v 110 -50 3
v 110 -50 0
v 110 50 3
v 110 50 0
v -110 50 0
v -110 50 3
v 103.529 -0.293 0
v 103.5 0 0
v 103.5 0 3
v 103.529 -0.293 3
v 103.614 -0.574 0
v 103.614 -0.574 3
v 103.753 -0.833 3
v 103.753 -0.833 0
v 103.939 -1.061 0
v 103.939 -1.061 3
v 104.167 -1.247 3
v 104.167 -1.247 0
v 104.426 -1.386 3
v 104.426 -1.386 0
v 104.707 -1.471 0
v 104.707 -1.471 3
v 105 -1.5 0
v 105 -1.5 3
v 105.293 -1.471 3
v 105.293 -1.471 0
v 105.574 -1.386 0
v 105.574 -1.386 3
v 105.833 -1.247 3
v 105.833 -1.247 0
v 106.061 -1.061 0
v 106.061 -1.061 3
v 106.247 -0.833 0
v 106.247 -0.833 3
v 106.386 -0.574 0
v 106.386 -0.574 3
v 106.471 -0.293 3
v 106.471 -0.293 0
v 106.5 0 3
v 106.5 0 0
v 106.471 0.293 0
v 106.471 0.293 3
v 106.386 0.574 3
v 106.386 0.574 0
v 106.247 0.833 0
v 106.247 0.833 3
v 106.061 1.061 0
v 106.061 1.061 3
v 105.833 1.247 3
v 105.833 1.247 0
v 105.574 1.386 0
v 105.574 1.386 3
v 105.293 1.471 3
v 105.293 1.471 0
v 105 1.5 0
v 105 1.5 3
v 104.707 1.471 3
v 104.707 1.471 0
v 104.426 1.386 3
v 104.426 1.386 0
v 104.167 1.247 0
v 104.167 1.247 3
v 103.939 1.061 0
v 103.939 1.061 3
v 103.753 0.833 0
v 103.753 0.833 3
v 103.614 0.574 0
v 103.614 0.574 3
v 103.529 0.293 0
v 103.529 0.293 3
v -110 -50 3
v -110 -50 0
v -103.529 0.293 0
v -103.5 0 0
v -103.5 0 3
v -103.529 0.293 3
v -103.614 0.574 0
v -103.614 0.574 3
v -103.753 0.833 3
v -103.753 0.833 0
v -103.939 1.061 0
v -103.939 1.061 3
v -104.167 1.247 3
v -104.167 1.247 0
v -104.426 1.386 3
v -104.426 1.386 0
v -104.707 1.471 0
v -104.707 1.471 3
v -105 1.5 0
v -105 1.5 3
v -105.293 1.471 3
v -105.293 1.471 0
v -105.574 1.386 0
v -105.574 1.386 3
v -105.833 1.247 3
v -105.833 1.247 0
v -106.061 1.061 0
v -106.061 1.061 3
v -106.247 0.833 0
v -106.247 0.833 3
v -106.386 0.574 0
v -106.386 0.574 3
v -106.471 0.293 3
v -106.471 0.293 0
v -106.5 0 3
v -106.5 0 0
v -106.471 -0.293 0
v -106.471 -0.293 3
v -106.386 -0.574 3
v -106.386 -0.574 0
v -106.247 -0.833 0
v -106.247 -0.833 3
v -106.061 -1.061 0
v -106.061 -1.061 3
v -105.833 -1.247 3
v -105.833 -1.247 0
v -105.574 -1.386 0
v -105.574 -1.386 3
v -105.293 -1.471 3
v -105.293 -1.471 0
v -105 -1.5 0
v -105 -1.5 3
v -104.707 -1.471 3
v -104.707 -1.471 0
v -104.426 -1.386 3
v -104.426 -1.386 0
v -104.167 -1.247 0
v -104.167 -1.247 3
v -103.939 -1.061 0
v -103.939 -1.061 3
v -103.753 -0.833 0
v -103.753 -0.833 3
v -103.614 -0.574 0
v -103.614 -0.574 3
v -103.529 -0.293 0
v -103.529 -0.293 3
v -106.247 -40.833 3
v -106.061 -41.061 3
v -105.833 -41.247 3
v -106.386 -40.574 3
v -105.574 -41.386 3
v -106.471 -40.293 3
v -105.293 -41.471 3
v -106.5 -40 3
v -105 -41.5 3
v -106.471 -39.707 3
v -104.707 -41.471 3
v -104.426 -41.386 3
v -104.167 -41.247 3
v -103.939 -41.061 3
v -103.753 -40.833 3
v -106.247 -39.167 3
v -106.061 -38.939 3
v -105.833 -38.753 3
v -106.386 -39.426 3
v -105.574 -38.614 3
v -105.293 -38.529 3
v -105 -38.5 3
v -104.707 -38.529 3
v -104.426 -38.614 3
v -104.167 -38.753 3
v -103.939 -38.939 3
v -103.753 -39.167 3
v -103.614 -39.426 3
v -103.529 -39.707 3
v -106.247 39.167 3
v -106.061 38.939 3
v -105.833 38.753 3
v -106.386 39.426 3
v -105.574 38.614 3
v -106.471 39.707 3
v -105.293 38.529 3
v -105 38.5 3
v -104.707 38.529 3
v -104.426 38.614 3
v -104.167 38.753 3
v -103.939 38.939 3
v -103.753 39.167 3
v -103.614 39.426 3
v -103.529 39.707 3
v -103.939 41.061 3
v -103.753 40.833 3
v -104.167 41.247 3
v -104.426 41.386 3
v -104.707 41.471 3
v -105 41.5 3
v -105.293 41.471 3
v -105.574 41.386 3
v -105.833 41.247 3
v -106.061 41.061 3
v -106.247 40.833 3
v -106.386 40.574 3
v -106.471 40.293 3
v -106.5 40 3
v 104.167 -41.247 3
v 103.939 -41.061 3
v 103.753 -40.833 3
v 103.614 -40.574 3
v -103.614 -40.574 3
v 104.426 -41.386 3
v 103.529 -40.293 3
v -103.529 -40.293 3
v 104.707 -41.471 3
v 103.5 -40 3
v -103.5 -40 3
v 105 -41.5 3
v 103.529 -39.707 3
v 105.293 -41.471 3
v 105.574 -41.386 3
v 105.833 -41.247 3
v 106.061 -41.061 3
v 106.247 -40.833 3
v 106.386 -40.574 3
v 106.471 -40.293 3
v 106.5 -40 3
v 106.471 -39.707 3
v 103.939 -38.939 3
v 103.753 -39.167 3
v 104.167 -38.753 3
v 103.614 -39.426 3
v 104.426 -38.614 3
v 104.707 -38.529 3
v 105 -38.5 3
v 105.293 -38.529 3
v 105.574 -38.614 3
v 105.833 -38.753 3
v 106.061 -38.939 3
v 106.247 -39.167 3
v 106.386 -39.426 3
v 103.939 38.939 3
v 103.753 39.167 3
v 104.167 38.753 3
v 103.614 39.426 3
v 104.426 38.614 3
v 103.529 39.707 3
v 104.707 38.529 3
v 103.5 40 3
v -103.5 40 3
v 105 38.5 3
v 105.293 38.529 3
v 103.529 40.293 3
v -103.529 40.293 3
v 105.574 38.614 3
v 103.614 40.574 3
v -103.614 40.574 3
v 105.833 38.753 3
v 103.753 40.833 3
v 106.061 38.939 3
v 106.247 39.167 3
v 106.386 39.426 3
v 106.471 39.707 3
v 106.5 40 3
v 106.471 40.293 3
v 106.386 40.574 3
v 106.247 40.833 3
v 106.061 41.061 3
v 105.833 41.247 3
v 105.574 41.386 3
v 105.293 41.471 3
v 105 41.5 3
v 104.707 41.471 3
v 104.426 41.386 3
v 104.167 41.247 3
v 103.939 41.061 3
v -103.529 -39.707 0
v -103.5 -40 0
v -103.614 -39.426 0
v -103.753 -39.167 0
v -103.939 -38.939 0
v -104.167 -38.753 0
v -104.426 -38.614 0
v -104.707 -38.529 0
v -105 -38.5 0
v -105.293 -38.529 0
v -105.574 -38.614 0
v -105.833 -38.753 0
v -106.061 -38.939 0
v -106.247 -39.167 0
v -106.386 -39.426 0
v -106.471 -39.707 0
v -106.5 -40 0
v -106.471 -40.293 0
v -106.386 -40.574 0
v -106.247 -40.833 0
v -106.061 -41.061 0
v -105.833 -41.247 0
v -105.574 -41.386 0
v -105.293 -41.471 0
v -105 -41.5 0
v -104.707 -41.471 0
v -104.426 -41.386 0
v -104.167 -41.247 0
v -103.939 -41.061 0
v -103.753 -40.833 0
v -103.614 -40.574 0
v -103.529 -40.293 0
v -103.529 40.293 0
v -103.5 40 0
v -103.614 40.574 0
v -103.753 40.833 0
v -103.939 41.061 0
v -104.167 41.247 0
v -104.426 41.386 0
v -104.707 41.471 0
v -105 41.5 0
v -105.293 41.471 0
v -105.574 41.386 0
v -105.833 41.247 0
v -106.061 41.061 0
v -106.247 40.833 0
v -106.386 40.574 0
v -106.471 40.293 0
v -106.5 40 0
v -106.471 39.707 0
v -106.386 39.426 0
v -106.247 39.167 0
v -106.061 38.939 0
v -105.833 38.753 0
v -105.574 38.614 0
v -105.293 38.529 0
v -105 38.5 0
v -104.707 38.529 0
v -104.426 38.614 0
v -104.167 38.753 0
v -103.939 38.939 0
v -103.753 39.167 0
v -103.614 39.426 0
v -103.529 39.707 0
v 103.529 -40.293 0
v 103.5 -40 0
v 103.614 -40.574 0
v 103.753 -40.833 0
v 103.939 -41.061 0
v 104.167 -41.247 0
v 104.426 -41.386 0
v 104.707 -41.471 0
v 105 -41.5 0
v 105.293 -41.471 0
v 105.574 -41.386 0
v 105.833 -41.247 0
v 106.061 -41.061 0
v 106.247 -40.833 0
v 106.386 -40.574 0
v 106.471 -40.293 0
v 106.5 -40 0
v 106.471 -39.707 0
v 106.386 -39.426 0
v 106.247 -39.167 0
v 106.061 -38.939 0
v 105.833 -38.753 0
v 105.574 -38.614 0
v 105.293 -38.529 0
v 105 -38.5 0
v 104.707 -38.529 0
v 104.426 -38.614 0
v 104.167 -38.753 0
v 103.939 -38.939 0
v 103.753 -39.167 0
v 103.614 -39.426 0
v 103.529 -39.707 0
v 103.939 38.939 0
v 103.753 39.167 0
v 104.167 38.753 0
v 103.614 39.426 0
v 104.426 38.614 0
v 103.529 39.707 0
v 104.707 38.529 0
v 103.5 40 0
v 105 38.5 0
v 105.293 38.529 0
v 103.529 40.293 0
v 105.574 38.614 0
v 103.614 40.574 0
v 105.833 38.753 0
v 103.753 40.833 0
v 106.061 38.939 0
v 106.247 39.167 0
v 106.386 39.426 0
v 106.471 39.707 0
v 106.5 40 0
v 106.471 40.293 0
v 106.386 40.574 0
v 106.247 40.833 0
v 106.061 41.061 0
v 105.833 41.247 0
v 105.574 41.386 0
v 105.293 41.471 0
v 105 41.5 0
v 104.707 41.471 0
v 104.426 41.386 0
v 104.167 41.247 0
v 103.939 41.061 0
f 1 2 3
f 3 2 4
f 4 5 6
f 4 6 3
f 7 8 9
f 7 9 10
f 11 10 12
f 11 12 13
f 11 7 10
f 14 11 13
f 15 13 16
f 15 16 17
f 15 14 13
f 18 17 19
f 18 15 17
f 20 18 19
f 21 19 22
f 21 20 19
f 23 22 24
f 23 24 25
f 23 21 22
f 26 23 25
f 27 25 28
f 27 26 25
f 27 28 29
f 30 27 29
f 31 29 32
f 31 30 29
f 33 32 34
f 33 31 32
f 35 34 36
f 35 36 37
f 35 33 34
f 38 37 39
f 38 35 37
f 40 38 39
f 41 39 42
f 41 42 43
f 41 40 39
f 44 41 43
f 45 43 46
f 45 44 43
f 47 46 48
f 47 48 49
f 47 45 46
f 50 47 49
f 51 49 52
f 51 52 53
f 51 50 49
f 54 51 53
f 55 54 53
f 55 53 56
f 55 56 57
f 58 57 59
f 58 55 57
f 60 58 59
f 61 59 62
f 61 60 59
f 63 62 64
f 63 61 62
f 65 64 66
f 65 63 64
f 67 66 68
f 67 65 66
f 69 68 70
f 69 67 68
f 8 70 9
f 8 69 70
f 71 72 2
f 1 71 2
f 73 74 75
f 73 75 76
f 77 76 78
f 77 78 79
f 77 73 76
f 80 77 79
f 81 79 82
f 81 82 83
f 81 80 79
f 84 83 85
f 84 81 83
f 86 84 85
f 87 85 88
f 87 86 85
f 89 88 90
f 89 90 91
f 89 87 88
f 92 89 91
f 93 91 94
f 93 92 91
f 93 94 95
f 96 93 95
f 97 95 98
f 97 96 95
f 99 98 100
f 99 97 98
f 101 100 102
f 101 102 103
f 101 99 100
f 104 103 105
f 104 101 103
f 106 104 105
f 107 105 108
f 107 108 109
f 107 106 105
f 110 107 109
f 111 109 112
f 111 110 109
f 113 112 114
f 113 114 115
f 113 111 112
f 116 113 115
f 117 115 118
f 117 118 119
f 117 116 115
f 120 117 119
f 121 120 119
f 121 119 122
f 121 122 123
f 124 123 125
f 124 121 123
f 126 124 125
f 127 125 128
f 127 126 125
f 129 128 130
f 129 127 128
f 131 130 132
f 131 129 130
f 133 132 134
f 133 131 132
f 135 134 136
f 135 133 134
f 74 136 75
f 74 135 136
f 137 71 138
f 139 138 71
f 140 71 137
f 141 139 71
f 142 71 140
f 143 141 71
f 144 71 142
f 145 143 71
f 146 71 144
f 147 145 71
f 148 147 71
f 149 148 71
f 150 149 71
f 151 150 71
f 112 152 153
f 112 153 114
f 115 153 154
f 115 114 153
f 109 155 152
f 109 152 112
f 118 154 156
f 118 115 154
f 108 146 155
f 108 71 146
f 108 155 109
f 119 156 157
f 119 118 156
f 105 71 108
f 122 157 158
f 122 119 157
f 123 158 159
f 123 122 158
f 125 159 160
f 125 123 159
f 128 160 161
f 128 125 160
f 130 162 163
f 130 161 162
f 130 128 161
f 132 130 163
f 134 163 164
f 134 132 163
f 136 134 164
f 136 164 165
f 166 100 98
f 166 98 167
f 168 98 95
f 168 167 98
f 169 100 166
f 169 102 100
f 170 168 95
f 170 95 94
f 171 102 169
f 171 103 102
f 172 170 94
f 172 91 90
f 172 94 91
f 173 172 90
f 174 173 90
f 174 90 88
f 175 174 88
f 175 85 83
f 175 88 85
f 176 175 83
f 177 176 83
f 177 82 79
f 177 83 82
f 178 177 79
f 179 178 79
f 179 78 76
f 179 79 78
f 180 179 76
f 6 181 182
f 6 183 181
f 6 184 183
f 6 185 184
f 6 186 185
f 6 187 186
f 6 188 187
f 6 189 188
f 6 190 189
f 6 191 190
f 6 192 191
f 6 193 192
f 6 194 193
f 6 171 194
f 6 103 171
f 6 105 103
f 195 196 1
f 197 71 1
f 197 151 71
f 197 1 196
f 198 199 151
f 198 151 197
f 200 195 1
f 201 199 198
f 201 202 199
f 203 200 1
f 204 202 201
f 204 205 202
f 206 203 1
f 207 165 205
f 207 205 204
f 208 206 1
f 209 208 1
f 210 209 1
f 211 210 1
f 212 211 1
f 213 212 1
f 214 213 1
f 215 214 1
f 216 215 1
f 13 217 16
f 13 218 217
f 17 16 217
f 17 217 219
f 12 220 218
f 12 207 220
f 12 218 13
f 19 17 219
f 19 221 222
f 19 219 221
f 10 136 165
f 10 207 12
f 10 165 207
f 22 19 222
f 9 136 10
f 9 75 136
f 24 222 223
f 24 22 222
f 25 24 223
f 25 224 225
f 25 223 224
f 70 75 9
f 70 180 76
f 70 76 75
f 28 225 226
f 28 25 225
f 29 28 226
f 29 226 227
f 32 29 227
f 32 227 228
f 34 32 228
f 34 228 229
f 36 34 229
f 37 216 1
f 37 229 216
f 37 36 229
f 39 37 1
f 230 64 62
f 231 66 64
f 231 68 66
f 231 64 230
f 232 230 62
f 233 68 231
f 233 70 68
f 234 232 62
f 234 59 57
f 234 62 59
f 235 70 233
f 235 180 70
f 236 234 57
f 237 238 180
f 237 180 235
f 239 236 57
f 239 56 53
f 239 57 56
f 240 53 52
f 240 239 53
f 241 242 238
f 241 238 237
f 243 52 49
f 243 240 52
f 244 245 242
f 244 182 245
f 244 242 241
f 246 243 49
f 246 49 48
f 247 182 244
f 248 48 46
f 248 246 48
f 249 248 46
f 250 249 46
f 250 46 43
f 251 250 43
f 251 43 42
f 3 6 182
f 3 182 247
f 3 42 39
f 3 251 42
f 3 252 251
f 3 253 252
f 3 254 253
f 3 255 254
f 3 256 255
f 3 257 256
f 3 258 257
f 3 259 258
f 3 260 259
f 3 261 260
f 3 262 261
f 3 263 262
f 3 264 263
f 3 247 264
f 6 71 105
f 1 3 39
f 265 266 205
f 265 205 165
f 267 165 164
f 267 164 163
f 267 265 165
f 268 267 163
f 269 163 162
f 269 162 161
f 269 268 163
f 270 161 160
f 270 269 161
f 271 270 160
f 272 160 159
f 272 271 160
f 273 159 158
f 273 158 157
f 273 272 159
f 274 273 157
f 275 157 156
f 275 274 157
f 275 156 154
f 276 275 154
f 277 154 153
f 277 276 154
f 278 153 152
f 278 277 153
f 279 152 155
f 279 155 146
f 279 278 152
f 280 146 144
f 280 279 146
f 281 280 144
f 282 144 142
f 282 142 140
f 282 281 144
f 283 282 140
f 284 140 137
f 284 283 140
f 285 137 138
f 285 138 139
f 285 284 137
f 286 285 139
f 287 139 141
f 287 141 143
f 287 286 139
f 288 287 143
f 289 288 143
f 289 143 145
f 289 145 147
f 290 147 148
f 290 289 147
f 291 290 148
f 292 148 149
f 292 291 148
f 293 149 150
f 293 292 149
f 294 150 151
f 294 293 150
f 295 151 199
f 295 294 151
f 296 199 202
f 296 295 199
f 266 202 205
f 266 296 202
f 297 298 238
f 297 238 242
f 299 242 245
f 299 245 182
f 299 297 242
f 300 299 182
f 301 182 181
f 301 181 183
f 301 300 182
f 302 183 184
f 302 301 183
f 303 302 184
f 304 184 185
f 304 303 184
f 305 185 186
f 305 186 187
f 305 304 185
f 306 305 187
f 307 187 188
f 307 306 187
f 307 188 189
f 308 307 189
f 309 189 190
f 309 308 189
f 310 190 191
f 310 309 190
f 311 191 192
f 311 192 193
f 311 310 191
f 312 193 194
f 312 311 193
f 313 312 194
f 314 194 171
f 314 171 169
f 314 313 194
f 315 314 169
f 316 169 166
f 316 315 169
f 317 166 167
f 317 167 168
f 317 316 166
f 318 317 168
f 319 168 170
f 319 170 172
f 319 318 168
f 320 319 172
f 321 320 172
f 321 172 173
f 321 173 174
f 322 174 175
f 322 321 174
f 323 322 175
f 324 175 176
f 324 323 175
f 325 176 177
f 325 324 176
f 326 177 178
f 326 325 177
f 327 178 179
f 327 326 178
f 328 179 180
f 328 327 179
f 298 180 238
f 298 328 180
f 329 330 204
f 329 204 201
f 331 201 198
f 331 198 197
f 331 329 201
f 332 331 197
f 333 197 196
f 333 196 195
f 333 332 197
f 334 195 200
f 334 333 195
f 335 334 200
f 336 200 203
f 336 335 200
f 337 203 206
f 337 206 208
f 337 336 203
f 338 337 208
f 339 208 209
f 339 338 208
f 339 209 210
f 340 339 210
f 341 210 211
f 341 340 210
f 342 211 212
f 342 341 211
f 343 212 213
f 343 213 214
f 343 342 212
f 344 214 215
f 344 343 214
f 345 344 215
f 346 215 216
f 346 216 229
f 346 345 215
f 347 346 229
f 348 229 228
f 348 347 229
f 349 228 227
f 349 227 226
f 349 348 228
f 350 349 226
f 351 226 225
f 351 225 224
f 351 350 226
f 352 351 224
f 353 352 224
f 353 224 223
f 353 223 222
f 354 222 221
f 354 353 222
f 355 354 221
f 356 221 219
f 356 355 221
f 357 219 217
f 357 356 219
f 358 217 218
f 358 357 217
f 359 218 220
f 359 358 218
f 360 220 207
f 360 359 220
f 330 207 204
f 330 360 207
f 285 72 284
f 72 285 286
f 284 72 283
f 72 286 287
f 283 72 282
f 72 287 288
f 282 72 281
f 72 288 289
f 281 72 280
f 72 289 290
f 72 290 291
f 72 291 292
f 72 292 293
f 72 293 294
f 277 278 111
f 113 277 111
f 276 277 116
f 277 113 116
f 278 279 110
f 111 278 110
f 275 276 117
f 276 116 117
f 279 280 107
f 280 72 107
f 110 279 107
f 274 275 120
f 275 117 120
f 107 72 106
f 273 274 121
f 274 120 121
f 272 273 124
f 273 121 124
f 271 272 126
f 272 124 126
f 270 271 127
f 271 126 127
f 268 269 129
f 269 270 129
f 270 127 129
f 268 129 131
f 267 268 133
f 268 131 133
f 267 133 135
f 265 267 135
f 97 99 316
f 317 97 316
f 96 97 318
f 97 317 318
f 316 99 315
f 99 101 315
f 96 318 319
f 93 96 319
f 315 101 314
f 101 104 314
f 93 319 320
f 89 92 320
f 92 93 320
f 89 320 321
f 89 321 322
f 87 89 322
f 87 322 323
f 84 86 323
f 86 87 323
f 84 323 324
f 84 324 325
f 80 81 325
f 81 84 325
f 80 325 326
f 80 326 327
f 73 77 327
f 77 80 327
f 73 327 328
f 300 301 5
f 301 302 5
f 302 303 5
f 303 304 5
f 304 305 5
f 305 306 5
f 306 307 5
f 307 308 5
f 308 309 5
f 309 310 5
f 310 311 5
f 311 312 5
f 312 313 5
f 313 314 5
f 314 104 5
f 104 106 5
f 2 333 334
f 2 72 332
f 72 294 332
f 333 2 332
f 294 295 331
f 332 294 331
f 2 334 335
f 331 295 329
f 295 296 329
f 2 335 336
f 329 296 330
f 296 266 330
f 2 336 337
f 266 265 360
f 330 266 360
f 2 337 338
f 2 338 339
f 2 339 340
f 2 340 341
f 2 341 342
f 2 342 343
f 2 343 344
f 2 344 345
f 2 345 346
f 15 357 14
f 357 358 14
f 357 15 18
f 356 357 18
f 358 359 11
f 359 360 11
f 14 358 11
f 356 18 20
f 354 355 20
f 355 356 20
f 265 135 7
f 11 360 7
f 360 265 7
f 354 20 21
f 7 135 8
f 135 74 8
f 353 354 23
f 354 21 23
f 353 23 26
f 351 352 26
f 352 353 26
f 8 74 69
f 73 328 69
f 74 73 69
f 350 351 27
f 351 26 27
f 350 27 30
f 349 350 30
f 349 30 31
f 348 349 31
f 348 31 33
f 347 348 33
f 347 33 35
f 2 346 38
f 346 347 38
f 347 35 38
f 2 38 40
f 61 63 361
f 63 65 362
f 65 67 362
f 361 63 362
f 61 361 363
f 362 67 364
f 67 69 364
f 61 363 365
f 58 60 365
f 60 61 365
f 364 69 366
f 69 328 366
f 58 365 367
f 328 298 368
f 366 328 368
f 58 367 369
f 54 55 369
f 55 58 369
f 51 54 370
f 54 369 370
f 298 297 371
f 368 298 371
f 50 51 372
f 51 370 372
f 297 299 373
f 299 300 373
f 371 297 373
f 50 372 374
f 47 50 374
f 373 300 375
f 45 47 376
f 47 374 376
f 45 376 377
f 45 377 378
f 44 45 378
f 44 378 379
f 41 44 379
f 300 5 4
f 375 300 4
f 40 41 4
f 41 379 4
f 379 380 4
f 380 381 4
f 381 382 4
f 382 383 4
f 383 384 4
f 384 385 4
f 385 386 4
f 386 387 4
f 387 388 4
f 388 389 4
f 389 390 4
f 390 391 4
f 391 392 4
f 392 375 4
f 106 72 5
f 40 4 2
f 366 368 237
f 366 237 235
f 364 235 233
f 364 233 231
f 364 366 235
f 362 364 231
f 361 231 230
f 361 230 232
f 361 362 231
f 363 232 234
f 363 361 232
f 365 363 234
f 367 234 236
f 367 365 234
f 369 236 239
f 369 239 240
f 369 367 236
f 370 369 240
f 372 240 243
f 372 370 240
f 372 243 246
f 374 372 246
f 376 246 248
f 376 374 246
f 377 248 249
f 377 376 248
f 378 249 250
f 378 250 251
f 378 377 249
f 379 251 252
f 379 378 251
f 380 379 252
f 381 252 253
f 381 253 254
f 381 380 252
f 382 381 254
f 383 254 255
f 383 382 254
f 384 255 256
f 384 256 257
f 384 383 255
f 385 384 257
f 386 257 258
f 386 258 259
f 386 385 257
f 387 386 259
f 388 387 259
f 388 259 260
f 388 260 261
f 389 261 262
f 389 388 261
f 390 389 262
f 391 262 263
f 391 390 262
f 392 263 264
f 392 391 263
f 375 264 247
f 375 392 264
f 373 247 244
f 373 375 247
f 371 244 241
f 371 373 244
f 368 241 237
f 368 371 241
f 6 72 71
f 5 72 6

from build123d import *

# Parameters (mm, degrees)
ESQUISSE1_W        = 220
ESQUISSE1_H        = 100
ESQUISSE1_R        = 1.5
BOSS_EXTRU_1_DEPTH = 3


with BuildPart() as part:
    # Esquisse1 → Boss.-Extru.1 (new body)
    with BuildSketch(Plane.XY):
        Rectangle(ESQUISSE1_W, ESQUISSE1_H)
        with Locations((-105, -40)):
            Circle(ESQUISSE1_R, mode=Mode.SUBTRACT)
        with Locations((-105, 0)):
            Circle(ESQUISSE1_R, mode=Mode.SUBTRACT)
        with Locations((-105, 40)):
            Circle(ESQUISSE1_R, mode=Mode.SUBTRACT)
        with Locations(Location((105, 40, 0), (0, 0, 180))):
            Circle(ESQUISSE1_R, mode=Mode.SUBTRACT)
        with Locations(Location((105, 0, 0), (0, 0, 180))):
            Circle(ESQUISSE1_R, mode=Mode.SUBTRACT)
        with Locations(Location((105, -40, 0), (0, 0, 180))):
            Circle(ESQUISSE1_R, mode=Mode.SUBTRACT)
    extrude(amount=BOSS_EXTRU_1_DEPTH)


solid = part.part
